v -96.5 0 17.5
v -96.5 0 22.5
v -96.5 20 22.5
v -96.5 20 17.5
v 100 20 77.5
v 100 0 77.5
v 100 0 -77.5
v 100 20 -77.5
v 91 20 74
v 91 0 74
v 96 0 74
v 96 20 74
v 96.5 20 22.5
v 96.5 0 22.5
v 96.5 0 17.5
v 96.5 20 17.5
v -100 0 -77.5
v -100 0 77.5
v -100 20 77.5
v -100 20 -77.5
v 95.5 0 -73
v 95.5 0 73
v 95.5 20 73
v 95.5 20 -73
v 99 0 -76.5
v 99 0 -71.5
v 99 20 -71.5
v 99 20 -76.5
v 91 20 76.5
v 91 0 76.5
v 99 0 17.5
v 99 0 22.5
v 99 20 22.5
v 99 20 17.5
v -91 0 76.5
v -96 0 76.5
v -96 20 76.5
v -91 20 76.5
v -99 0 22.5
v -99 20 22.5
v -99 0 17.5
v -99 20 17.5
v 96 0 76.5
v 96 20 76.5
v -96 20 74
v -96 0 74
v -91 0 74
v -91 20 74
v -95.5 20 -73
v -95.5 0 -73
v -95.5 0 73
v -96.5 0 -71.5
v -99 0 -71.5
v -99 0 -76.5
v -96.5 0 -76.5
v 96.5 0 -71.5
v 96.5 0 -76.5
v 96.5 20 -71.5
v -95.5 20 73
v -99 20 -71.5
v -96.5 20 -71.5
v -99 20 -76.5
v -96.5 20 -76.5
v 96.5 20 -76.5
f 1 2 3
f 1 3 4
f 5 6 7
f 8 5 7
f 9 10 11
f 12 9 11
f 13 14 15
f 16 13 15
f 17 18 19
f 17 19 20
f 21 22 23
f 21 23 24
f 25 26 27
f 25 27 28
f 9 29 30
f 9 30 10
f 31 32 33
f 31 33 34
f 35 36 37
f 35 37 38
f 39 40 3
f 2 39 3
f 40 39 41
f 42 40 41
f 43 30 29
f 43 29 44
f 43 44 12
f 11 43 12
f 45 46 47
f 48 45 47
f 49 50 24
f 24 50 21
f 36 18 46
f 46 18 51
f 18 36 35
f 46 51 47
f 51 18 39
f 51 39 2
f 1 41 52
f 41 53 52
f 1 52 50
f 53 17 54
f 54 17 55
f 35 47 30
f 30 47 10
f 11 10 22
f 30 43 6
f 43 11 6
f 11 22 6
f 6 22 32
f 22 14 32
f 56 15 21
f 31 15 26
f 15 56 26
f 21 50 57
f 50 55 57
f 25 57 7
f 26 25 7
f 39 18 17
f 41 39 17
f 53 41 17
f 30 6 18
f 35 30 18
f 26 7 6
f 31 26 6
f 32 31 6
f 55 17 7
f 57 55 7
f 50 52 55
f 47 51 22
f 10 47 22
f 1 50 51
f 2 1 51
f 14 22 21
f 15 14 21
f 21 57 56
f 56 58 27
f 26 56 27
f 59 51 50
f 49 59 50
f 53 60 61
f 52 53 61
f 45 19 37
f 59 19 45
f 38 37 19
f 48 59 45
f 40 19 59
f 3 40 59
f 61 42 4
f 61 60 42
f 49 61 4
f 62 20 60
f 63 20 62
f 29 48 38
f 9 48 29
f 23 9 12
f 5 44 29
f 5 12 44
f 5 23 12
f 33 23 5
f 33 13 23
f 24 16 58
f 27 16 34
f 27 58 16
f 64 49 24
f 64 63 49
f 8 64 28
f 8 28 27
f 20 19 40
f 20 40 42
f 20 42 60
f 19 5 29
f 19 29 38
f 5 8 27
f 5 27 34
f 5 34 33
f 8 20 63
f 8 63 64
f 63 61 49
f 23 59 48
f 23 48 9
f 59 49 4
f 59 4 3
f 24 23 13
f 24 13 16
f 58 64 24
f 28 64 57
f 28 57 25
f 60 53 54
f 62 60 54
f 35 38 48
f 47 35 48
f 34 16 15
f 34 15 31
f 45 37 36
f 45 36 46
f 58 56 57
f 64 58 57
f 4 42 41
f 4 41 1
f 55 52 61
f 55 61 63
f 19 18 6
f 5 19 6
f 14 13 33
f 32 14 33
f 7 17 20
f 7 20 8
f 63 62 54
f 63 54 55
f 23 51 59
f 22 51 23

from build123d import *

# Parameters (mm, degrees)
SKETCH1_W      = 200
SKETCH1_H      = 155
SKETCH1_W_2    = 191
SKETCH1_H_2    = 146
SKETCH1_W_3    = 5
SKETCH1_H_3    = 2.5
SKETCH1_W_4    = 2.5
SKETCH1_H_4    = 5
MAINBODY_DEPTH = 20


with BuildPart() as part:
    # Sketch1 → MainBody (new body)
    with BuildSketch(Plane(origin=(0, 0, 0), x_dir=(1, 0, 0), z_dir=(0, 1, 0))):
        Rectangle(SKETCH1_W, SKETCH1_H)
        Rectangle(SKETCH1_W_2, SKETCH1_H_2, mode=Mode.SUBTRACT)
        with Locations((93.5, -75.25)):
            Rectangle(SKETCH1_W_3, SKETCH1_H_3, mode=Mode.SUBTRACT)
        with Locations((-93.5, -75.25)):
            Rectangle(SKETCH1_W_3, SKETCH1_H_3, mode=Mode.SUBTRACT)
        with Locations((97.75, -20)):
            Rectangle(SKETCH1_W_4, SKETCH1_H_4, mode=Mode.SUBTRACT)
        with Locations((97.75, 74)):
            Rectangle(SKETCH1_W_4, SKETCH1_H_4, mode=Mode.SUBTRACT)
        with Locations((-97.75, -20)):
            Rectangle(SKETCH1_W_4, SKETCH1_H_4, mode=Mode.SUBTRACT)
        with Locations((-97.75, 74)):
            Rectangle(SKETCH1_W_4, SKETCH1_H_4, mode=Mode.SUBTRACT)
    extrude(amount=MAINBODY_DEPTH)


solid = part.part
